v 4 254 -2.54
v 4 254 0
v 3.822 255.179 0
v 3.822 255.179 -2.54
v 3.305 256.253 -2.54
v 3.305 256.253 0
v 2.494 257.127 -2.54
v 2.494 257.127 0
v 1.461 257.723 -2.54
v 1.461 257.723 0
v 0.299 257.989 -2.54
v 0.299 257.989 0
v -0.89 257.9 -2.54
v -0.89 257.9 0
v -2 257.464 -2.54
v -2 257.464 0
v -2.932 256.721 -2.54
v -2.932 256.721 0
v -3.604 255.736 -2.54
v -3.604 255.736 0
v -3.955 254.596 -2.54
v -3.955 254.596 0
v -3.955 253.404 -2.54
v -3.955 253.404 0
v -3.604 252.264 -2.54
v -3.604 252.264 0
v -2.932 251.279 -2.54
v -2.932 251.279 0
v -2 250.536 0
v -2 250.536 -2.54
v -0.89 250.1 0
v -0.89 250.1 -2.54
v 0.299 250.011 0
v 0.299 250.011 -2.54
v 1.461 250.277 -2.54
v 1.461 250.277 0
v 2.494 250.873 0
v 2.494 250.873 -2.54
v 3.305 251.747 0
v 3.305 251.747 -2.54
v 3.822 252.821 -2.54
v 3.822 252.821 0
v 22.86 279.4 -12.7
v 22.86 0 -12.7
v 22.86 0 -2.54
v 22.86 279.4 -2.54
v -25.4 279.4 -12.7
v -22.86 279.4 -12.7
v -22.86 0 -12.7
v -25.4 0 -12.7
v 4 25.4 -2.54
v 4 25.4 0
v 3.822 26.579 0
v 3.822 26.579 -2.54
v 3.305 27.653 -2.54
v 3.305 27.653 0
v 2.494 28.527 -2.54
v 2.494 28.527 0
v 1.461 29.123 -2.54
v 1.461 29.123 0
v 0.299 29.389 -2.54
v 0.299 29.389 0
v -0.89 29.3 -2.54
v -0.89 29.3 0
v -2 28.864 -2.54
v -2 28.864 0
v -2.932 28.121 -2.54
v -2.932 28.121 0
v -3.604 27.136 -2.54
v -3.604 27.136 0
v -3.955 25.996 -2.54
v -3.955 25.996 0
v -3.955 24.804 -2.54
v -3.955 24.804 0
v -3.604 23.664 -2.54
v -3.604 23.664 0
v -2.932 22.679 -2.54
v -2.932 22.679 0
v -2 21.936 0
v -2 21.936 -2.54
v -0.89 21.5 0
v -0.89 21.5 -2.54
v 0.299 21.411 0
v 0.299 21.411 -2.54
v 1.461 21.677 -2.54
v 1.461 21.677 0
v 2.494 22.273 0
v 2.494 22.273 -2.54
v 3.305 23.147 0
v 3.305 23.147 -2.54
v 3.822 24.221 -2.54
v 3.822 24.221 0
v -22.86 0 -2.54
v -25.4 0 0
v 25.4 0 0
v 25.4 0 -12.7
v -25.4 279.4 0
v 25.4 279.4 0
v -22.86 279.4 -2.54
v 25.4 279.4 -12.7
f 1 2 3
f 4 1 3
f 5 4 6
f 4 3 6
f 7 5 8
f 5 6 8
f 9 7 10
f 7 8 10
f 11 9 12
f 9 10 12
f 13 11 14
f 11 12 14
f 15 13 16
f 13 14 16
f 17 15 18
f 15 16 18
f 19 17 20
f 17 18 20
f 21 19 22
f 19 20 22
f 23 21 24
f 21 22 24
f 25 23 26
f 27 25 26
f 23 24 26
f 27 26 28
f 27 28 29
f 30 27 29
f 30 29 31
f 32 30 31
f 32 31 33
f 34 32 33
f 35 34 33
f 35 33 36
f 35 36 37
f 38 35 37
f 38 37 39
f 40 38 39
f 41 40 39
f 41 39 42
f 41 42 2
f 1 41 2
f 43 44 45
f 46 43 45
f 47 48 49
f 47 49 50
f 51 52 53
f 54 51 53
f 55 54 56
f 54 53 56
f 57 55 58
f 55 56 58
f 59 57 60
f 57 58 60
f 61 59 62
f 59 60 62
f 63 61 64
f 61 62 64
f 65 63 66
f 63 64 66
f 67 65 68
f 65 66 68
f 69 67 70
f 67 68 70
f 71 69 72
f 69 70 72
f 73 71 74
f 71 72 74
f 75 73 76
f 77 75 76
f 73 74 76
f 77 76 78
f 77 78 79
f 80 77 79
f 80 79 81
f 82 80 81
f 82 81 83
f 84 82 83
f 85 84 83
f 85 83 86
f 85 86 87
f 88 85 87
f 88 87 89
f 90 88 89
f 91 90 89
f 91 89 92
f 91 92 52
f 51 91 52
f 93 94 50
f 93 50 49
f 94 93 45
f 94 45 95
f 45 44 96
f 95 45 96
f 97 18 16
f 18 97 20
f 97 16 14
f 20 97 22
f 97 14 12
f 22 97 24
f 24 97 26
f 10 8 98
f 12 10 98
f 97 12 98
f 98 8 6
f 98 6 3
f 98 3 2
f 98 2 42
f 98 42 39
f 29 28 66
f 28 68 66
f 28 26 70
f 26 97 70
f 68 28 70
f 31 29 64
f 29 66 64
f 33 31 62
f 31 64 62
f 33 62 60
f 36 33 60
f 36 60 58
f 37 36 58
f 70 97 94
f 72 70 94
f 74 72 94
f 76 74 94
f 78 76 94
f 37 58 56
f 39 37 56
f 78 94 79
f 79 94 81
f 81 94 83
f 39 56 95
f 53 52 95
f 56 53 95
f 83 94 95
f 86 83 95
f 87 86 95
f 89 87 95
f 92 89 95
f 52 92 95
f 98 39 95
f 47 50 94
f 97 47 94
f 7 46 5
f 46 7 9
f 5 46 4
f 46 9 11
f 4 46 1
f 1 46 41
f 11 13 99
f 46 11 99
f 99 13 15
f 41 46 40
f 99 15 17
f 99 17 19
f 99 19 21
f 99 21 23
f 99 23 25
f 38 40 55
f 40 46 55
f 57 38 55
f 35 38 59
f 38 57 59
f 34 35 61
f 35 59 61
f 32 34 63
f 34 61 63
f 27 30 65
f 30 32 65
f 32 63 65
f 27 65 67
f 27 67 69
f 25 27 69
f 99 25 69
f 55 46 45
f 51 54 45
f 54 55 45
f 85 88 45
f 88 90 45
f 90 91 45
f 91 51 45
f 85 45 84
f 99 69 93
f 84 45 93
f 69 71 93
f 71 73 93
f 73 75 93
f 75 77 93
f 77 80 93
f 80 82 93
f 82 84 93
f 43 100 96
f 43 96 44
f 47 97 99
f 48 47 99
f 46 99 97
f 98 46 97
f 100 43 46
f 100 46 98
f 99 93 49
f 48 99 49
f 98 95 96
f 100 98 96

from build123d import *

# Parameters (mm, degrees)
BOSS_EXTRUDE1_DEPTH = 279.4
CUT_EXTRUDE1_REACH  = 282.839
SKETCH2_R           = 4.0000047


with BuildPart() as part:
    # Sketch1 → Boss-Extrude1 (new body)
    with BuildSketch(Plane(origin=(0, 0, 0), x_dir=(1, 0, 0), z_dir=(0, 1, 0))):
        Polygon((-22.86, 2.54), (-22.86, 12.7), (-25.4, 12.7), (-25.4, 0), (25.4, 0), (25.4, 12.7), (22.86, 12.7), (22.86, 2.54), align=None)
    extrude(amount=BOSS_EXTRUDE1_DEPTH)

    # Sketch2 → Cut-Extrude1 (cut, up to next)
    with BuildSketch(Plane.XY, mode=Mode.PRIVATE) as cut_extrude1_sk1:
        with Locations((0, 25.4)):
            Circle(SKETCH2_R)
    cut_extrude1_tool1 = extrude(cut_extrude1_sk1.sketch, amount=-CUT_EXTRUDE1_REACH, mode=Mode.PRIVATE) & part.part
    # Sketch2 → Cut-Extrude1 (cut, up to next)
    with BuildSketch(Plane.XY, mode=Mode.PRIVATE) as cut_extrude1_sk2:
        with Locations((0, 254)):
            Circle(SKETCH2_R)
    cut_extrude1_tool2 = extrude(cut_extrude1_sk2.sketch, amount=-CUT_EXTRUDE1_REACH, mode=Mode.PRIVATE) & part.part
    add(cut_extrude1_tool1.solids().sort_by_distance((0, 25.4, 0))[0], mode=Mode.SUBTRACT)
    add(cut_extrude1_tool2.solids().sort_by_distance((0, 254, 0))[0], mode=Mode.SUBTRACT)


solid = part.part
